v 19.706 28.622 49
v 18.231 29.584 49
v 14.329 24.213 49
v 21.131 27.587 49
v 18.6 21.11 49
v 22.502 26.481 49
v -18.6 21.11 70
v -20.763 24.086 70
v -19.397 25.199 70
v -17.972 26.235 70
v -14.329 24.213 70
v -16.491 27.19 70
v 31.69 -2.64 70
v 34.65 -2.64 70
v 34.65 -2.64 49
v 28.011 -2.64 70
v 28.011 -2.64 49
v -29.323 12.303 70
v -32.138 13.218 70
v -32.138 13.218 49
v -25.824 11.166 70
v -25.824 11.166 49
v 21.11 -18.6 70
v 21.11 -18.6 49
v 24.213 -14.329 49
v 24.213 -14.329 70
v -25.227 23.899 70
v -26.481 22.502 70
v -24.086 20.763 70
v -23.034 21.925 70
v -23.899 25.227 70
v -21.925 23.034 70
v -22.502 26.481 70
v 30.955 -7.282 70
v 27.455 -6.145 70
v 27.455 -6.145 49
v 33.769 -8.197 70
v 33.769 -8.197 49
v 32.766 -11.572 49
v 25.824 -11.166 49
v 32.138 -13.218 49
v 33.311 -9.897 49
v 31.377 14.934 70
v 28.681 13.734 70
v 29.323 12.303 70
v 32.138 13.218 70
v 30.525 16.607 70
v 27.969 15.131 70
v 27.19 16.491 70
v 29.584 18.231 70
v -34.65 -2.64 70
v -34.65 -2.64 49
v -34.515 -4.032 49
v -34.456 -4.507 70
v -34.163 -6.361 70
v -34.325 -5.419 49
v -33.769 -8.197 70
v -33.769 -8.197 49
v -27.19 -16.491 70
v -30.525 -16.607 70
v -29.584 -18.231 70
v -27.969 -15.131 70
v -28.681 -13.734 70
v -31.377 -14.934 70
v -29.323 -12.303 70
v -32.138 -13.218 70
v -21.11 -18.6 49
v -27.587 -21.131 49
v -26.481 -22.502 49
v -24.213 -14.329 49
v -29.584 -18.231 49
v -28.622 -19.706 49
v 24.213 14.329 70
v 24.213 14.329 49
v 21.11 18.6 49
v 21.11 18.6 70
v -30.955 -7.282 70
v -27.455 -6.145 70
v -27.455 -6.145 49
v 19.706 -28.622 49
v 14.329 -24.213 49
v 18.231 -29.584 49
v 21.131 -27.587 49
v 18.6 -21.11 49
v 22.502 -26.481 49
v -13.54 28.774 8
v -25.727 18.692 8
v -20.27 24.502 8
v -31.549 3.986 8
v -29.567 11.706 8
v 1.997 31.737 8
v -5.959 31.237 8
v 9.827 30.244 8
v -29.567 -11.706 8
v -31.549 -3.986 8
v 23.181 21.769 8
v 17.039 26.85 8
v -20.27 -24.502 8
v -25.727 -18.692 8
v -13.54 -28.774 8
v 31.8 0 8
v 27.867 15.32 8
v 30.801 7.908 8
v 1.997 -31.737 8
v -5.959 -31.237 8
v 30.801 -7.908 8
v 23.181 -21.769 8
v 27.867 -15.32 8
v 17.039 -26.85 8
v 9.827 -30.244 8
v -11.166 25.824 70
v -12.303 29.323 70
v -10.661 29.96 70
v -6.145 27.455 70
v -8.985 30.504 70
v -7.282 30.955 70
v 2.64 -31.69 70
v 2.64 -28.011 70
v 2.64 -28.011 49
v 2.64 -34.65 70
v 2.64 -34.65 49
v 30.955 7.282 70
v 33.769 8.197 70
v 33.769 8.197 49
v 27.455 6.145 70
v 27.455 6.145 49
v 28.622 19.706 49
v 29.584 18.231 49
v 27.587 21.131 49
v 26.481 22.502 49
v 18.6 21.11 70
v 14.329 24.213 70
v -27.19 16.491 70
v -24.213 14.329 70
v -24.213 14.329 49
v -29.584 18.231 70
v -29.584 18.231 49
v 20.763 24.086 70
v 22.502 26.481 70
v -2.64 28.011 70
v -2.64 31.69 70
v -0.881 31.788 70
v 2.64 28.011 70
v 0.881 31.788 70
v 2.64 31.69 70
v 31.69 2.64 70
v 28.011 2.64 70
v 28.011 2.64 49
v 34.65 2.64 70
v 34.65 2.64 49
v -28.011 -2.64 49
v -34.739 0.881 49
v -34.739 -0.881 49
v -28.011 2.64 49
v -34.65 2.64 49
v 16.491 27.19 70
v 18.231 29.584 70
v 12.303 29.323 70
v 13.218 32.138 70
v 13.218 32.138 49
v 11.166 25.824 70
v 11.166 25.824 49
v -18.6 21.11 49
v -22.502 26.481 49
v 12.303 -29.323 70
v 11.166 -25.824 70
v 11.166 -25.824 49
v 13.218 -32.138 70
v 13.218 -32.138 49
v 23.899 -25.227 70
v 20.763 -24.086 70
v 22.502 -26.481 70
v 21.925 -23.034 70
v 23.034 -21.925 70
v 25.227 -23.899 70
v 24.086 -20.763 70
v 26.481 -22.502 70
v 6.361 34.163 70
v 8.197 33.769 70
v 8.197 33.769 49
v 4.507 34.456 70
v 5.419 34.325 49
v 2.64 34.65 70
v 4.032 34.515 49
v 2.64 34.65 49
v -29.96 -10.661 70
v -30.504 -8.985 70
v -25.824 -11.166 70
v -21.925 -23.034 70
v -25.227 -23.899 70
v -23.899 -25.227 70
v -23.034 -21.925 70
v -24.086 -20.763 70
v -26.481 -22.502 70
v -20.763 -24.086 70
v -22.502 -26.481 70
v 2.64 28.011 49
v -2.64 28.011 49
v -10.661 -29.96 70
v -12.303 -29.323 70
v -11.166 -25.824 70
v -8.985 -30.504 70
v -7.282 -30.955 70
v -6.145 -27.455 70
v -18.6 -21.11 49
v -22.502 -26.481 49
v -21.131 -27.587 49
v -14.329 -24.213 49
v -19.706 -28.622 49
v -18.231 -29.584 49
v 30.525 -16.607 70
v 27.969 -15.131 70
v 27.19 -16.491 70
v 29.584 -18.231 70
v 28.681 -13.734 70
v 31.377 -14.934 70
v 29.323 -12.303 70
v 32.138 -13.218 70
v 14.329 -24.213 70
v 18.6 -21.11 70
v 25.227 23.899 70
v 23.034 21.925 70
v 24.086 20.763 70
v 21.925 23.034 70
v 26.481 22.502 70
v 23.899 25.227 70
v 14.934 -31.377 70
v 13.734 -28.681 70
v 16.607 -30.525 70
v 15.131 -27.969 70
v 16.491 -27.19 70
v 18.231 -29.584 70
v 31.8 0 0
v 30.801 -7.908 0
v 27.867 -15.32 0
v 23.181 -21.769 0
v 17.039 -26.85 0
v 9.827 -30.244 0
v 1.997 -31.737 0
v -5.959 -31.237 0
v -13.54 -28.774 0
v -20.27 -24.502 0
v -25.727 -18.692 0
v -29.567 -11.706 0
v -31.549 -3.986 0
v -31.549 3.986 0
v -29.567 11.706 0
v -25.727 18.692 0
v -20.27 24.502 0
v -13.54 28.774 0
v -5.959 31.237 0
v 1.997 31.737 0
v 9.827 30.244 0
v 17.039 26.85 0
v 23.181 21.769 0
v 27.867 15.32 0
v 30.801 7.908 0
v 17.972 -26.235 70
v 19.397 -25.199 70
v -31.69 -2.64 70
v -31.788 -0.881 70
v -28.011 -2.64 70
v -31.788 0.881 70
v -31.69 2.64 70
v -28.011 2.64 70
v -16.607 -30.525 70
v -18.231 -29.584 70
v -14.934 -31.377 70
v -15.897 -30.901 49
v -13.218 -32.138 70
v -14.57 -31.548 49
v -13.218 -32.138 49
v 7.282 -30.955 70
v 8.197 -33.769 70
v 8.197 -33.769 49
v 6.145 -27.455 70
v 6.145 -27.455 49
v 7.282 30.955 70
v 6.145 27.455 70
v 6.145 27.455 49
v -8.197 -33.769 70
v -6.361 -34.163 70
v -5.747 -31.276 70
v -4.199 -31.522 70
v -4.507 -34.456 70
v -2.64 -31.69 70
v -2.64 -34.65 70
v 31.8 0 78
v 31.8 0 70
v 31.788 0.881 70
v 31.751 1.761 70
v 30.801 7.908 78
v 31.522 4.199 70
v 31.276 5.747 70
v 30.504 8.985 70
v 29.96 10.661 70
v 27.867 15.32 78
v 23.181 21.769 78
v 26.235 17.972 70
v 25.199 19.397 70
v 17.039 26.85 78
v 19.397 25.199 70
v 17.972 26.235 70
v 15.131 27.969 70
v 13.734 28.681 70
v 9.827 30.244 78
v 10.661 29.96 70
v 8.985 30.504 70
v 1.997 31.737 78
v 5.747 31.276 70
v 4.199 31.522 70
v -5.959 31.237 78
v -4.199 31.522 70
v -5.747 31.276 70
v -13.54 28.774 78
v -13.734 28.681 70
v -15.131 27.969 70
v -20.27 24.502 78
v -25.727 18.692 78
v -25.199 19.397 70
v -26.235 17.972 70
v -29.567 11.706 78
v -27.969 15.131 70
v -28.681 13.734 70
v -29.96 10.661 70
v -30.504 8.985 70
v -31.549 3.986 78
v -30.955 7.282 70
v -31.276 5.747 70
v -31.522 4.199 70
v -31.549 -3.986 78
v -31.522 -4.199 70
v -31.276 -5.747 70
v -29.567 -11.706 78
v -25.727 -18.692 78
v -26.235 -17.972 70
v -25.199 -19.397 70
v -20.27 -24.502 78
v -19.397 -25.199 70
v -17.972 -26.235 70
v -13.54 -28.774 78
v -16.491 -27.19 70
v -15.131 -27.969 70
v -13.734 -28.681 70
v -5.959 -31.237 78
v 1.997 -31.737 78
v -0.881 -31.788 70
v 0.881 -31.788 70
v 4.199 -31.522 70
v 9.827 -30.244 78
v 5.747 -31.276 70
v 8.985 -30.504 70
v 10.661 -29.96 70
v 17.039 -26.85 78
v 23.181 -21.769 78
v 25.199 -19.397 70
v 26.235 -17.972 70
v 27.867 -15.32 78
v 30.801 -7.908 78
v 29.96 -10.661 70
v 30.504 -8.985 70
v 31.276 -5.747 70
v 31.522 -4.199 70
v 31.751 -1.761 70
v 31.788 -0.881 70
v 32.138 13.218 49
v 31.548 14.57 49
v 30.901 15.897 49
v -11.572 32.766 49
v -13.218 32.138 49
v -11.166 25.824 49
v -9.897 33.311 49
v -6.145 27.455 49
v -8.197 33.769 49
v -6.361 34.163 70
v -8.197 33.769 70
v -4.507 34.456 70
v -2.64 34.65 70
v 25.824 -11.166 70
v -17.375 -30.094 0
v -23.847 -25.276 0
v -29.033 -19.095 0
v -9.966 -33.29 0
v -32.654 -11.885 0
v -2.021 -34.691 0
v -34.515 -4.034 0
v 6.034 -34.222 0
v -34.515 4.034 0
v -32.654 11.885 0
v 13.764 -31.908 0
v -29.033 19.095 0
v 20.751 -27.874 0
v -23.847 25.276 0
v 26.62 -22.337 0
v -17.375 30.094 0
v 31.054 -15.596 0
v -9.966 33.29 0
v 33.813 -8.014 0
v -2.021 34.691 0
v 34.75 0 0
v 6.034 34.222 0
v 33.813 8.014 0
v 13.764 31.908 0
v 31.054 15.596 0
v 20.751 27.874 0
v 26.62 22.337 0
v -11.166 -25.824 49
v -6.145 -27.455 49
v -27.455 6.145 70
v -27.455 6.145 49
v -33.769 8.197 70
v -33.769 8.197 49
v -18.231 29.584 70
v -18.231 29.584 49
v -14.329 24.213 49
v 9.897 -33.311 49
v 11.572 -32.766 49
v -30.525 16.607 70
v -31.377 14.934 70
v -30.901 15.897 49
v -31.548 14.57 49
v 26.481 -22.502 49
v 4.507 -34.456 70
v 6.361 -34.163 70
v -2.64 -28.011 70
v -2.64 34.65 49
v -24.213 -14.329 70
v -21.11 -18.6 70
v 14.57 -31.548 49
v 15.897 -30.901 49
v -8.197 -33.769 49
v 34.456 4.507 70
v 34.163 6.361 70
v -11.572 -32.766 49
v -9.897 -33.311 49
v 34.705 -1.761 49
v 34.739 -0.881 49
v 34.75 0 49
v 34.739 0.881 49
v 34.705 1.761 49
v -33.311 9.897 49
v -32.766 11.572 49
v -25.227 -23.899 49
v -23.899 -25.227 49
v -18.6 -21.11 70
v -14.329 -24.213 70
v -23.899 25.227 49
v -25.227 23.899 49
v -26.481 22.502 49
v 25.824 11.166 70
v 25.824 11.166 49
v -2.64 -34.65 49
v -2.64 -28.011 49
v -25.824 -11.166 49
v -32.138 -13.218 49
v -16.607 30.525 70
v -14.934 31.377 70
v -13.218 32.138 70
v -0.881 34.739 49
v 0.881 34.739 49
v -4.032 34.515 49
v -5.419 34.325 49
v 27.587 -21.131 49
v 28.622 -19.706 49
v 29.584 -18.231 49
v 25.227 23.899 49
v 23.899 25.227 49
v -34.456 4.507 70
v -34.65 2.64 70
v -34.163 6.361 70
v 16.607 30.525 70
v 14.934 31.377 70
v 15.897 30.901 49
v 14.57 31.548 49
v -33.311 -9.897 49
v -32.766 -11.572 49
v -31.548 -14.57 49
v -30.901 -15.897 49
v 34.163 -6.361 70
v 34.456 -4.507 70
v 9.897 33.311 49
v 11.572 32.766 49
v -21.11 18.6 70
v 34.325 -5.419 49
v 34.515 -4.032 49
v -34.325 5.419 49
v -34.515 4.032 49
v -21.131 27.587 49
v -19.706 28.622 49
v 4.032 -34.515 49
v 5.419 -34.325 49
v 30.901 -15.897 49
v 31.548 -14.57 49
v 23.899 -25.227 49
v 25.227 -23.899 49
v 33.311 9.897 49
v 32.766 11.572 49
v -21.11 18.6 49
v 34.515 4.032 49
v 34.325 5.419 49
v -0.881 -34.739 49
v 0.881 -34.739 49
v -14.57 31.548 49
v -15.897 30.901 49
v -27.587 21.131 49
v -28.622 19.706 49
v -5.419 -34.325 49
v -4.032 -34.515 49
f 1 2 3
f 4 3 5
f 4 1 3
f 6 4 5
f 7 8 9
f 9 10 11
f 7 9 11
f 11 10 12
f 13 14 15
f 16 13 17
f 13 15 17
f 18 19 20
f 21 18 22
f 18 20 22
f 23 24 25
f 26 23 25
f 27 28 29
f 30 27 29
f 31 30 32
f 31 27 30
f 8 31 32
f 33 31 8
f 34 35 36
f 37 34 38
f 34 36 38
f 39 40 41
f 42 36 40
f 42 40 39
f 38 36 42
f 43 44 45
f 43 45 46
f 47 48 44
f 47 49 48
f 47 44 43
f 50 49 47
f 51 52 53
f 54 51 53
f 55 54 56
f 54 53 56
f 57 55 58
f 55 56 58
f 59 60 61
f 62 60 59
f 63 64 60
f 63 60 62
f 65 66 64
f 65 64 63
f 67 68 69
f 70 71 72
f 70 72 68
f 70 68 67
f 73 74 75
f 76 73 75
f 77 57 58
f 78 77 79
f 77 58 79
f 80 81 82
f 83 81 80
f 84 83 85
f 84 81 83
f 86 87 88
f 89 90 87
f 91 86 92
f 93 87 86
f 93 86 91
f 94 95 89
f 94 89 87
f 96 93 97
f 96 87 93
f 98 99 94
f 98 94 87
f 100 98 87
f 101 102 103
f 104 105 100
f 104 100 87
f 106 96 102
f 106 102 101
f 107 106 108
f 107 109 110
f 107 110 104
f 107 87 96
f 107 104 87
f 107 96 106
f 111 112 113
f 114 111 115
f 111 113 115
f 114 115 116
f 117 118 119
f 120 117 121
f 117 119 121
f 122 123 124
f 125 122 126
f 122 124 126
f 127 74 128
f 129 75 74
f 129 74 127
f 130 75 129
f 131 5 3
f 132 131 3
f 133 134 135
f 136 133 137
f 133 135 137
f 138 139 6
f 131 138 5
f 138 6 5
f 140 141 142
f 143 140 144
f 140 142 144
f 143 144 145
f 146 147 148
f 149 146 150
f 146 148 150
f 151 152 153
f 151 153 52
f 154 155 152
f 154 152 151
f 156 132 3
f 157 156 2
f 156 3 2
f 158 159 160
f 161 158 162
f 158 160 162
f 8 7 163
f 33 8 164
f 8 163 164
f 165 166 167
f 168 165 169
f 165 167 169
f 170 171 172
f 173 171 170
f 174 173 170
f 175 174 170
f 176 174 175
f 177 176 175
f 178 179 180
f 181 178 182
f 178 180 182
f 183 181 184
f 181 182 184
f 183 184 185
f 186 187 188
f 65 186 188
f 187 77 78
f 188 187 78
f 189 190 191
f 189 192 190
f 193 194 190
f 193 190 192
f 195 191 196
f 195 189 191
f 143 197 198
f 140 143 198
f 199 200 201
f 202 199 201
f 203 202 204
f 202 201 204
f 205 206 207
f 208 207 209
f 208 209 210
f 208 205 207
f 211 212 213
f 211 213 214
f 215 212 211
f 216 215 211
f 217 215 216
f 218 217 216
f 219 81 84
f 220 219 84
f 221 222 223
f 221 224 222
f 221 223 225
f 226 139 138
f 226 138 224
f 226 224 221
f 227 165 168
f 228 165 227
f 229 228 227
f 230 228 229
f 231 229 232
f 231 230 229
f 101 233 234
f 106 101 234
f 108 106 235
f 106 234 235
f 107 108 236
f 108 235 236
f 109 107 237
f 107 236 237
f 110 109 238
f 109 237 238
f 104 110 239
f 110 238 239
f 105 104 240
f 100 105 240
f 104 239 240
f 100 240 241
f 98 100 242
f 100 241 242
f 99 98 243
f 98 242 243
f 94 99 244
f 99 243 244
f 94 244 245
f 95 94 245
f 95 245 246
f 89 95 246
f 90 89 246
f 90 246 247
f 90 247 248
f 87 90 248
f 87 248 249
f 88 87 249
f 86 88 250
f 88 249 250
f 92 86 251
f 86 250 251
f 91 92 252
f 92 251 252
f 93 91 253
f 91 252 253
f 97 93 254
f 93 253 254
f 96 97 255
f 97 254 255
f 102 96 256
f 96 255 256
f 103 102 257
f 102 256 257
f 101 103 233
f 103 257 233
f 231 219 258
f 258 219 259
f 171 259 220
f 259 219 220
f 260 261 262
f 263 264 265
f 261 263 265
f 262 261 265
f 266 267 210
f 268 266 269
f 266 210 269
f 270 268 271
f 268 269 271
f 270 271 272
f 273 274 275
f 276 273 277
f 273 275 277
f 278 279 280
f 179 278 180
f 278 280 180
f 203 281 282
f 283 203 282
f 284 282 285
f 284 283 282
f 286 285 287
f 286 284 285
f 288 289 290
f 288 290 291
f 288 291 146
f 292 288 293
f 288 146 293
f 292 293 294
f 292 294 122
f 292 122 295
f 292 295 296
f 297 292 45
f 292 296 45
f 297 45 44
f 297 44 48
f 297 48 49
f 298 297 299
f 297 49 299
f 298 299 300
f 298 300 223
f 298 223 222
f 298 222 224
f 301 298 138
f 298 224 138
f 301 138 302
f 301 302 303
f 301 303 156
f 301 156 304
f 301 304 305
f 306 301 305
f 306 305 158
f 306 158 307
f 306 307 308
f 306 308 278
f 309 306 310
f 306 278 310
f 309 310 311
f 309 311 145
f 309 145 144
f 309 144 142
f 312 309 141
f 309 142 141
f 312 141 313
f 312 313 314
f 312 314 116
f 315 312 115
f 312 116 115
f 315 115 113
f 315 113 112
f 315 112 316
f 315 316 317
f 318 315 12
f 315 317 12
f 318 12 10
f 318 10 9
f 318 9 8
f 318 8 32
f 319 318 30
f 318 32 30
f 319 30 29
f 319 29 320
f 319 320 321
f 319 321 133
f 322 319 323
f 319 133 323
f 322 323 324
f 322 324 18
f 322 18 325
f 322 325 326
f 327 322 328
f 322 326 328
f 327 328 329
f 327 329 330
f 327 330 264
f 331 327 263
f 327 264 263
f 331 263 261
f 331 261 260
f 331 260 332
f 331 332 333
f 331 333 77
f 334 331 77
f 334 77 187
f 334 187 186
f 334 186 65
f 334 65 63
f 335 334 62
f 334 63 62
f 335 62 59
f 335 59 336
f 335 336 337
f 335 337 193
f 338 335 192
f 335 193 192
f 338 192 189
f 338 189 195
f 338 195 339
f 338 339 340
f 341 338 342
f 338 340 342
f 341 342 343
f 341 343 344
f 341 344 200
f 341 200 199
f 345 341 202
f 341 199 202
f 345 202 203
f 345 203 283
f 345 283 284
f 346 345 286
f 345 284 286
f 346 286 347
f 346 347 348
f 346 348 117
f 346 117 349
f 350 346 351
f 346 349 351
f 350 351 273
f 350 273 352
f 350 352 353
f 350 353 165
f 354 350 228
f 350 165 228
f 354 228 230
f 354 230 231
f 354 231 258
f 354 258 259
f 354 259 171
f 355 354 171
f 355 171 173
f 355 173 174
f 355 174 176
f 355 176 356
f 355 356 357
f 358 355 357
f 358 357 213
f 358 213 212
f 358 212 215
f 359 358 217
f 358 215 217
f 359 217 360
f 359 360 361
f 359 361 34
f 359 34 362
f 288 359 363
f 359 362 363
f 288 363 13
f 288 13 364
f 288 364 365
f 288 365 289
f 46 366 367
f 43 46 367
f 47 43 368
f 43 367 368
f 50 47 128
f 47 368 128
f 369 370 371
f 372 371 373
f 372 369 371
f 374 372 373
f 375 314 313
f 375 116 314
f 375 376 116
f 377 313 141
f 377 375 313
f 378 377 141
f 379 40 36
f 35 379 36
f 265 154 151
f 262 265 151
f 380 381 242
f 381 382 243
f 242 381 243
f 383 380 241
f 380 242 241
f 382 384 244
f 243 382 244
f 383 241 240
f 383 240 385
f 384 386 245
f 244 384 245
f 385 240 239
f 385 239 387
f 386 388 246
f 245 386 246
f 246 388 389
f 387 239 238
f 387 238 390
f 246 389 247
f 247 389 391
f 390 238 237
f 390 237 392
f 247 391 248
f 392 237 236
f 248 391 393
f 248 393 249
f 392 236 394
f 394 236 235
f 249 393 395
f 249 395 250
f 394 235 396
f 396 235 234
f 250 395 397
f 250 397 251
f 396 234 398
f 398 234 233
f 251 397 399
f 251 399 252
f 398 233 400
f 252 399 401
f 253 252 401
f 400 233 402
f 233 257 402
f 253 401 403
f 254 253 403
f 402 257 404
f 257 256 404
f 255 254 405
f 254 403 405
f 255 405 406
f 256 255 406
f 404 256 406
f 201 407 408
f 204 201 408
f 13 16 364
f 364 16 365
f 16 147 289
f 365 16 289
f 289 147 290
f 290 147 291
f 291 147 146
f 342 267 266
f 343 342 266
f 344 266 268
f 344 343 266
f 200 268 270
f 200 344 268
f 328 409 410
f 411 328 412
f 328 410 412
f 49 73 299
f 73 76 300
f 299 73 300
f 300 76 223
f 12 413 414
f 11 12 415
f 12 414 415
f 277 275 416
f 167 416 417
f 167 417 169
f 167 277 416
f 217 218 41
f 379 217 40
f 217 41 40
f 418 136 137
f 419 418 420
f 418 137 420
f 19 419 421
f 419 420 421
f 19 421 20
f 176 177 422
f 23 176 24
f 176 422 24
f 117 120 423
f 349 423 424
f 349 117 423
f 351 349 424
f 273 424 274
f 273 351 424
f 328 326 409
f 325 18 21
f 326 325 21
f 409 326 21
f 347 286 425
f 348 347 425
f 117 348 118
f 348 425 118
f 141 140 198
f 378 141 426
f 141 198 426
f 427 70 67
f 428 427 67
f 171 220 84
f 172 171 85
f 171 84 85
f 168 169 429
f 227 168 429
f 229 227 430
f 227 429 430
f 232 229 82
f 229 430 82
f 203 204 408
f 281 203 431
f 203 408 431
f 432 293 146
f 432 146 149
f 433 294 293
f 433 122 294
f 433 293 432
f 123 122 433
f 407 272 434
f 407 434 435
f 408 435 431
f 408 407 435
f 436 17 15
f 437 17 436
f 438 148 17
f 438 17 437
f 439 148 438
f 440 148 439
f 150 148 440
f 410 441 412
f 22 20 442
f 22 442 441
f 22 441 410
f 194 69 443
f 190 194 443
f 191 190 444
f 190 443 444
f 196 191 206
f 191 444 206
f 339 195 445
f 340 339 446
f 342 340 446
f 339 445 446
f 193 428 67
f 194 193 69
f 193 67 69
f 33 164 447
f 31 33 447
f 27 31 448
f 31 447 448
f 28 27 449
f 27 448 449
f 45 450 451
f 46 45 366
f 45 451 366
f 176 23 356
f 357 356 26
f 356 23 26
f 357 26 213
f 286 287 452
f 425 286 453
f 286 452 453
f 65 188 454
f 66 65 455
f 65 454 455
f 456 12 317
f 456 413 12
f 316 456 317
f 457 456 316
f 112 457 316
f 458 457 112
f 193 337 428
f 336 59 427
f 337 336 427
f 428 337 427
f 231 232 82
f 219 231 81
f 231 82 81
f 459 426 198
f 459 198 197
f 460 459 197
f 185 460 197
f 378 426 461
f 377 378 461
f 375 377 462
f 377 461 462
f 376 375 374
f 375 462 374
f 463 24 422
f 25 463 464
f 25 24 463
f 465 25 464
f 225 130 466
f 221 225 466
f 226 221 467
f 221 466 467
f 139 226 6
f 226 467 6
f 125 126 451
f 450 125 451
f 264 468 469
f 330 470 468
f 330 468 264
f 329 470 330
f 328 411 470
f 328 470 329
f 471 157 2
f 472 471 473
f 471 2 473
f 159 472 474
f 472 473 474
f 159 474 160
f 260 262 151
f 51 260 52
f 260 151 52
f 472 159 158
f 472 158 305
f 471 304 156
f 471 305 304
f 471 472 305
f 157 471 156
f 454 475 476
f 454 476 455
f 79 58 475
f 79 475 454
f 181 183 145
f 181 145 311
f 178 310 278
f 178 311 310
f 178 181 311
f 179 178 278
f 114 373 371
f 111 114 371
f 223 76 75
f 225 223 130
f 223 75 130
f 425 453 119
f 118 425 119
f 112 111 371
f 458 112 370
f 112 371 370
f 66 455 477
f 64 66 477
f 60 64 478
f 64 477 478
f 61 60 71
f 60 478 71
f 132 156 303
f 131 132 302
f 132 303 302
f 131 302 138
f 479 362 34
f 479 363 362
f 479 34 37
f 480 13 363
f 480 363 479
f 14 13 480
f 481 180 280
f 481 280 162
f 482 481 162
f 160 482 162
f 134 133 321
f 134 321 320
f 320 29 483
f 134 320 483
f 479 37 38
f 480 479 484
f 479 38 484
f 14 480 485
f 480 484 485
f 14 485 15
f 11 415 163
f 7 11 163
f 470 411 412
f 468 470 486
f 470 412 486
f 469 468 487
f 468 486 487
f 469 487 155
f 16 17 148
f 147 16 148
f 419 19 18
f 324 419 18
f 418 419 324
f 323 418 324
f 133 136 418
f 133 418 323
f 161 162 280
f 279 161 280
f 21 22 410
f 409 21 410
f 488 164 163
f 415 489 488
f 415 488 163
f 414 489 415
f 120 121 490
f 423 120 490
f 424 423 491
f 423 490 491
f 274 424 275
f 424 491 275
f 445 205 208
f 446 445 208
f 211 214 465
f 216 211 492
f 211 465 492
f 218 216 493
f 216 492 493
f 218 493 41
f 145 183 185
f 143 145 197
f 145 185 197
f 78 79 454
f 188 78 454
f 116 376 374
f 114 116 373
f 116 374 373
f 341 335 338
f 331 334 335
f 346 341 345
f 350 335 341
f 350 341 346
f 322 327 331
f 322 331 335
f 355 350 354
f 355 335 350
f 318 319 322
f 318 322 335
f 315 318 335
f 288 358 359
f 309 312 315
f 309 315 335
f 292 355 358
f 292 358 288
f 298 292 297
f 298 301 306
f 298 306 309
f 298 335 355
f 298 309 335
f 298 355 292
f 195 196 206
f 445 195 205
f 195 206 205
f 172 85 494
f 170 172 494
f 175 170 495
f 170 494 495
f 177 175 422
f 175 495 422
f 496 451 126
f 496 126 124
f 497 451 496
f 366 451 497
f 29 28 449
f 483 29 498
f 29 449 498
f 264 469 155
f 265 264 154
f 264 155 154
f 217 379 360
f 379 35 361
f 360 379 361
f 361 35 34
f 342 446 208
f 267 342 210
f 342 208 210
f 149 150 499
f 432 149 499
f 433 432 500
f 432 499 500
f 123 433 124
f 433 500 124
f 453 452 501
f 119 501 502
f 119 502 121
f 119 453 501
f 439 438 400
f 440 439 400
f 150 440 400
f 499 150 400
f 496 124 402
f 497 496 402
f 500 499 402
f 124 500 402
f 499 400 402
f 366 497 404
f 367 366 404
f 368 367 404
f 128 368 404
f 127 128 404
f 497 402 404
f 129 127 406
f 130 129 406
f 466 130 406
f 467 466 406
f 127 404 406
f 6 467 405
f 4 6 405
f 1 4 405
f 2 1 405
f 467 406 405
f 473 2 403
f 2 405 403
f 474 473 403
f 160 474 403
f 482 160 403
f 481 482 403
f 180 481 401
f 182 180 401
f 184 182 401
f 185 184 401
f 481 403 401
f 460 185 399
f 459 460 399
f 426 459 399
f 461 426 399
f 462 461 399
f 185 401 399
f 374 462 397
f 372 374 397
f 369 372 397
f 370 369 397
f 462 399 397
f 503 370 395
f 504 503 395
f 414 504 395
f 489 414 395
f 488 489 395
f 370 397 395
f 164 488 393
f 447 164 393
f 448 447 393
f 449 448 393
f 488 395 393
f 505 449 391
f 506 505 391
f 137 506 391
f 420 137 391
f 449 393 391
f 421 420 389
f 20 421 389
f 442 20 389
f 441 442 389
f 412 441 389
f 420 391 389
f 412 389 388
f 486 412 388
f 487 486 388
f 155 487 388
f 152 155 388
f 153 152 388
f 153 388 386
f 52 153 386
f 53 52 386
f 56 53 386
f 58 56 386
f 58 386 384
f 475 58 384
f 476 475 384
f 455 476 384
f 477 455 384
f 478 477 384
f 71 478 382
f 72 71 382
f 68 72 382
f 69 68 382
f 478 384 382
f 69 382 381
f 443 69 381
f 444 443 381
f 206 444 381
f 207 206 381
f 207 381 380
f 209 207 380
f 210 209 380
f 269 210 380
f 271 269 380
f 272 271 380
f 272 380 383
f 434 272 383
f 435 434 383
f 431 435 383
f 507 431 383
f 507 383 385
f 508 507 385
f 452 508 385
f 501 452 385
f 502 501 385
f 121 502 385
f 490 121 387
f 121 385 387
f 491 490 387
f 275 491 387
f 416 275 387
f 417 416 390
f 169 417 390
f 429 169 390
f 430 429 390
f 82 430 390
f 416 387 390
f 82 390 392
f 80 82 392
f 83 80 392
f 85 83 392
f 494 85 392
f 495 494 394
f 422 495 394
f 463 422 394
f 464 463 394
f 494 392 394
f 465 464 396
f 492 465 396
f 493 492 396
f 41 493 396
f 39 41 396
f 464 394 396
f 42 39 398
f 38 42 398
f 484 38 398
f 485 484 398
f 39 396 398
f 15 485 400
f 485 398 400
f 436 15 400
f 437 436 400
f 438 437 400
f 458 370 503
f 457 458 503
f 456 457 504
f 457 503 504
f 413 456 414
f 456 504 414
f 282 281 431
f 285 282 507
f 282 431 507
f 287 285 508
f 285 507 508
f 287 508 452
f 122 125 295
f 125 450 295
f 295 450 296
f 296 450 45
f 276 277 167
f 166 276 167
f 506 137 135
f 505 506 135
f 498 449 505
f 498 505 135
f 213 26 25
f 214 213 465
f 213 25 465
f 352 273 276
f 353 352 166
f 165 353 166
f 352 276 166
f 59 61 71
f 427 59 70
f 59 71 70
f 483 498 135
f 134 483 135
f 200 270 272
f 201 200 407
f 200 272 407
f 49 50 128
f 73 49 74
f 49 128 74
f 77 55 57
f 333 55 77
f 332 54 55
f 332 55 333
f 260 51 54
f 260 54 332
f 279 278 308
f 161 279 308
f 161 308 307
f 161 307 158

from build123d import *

# Parameters (mm, degrees)
F0_R     = 34.75
F1_DEPTH = 49
F3_DEPTH = 21
F4_R     = 31.8
F5_DEPTH = 8
F6_R     = 31.8
F7_DEPTH = 8


with BuildPart() as f1:
    # F0 (on Top) → F1 (new body)
    with BuildSketch(Plane.XY):
        Circle(F0_R)
    extrude(amount=F1_DEPTH)

    # F2 (on face) → F3 (join)
    with BuildSketch(Plane.XY.offset(49)):
        with BuildLine():
            Line((-2.639753, 28.010705), (-2.639753, 34.649592))
            ThreePointArc((-2.639753, 34.649592), (-5.436098, 34.32217), (-8.196759, 33.769448))
            Line((-8.196759, 33.769448), (-6.14523, 27.455492))
            Line((-6.14523, 27.455492), (-11.166338, 25.824036))
            Line((-11.166338, 25.824036), (-13.217867, 32.137992))
            ThreePointArc((-13.217867, 32.137992), (-15.77617, 30.962477), (-18.230914, 29.583716))
            Line((-18.230914, 29.583716), (-14.328675, 24.212744))
            Line((-14.328675, 24.212744), (-18.599884, 21.109529))
            Line((-18.599884, 21.109529), (-22.502124, 26.480501))
            ThreePointArc((-22.502124, 26.480501), (-24.571961, 24.571961), (-26.480501, 22.502124))
            Line((-26.480501, 22.502124), (-21.109529, 18.599884))
            Line((-21.109529, 18.599884), (-24.212744, 14.328675))
            Line((-24.212744, 14.328675), (-29.583716, 18.230914))
            ThreePointArc((-29.583716, 18.230914), (-30.962477, 15.77617), (-32.137992, 13.217867))
            Line((-32.137992, 13.217867), (-25.824036, 11.166338))
            Line((-25.824036, 11.166338), (-27.455492, 6.14523))
            Line((-27.455492, 6.14523), (-33.769448, 8.196759))
            ThreePointArc((-33.769448, 8.196759), (-34.32217, 5.436098), (-34.649592, 2.639753))
            Line((-34.649592, 2.639753), (-28.010705, 2.639753))
            Line((-28.010705, 2.639753), (-28.010705, -2.639753))
            Line((-28.010705, -2.639753), (-34.649592, -2.639753))
            ThreePointArc((-34.649592, -2.639753), (-34.32217, -5.436098), (-33.769448, -8.196759))
            Line((-33.769448, -8.196759), (-27.455492, -6.14523))
            Line((-27.455492, -6.14523), (-25.824036, -11.166338))
            Line((-25.824036, -11.166338), (-32.137992, -13.217867))
            ThreePointArc((-32.137992, -13.217867), (-30.962477, -15.77617), (-29.583716, -18.230914))
            Line((-29.583716, -18.230914), (-24.212744, -14.328675))
            Line((-24.212744, -14.328675), (-21.109529, -18.599884))
            Line((-21.109529, -18.599884), (-26.480501, -22.502124))
            ThreePointArc((-26.480501, -22.502124), (-24.571961, -24.571961), (-22.502124, -26.480501))
            Line((-22.502124, -26.480501), (-18.599884, -21.109529))
            Line((-18.599884, -21.109529), (-14.328675, -24.212744))
            Line((-14.328675, -24.212744), (-18.230914, -29.583716))
            ThreePointArc((-18.230914, -29.583716), (-15.77617, -30.962477), (-13.217867, -32.137992))
            Line((-13.217867, -32.137992), (-11.166338, -25.824036))
            Line((-11.166338, -25.824036), (-6.14523, -27.455492))
            Line((-6.14523, -27.455492), (-8.196759, -33.769448))
            ThreePointArc((-8.196759, -33.769448), (-5.436098, -34.32217), (-2.639753, -34.649592))
            Line((-2.639753, -34.649592), (-2.639753, -28.010705))
            Line((-2.639753, -28.010705), (2.639753, -28.010705))
            Line((2.639753, -28.010705), (2.639753, -34.649592))
            ThreePointArc((2.639753, -34.649592), (5.436098, -34.32217), (8.196759, -33.769448))
            Line((8.196759, -33.769448), (6.14523, -27.455492))
            Line((6.14523, -27.455492), (11.166338, -25.824036))
            Line((11.166338, -25.824036), (13.217867, -32.137992))
            ThreePointArc((13.217867, -32.137992), (15.77617, -30.962477), (18.230914, -29.583716))
            Line((18.230914, -29.583716), (14.328675, -24.212744))
            Line((14.328675, -24.212744), (18.599884, -21.109529))
            Line((18.599884, -21.109529), (22.502124, -26.480501))
            ThreePointArc((22.502124, -26.480501), (24.571961, -24.571961), (26.480501, -22.502124))
            Line((26.480501, -22.502124), (21.109529, -18.599884))
            Line((21.109529, -18.599884), (24.212744, -14.328675))
            Line((24.212744, -14.328675), (29.583716, -18.230914))
            ThreePointArc((29.583716, -18.230914), (30.962477, -15.77617), (32.137992, -13.217867))
            Line((32.137992, -13.217867), (25.824036, -11.166338))
            Line((25.824036, -11.166338), (27.455492, -6.14523))
            Line((27.455492, -6.14523), (33.769448, -8.196759))
            ThreePointArc((33.769448, -8.196759), (34.32217, -5.436098), (34.649592, -2.639753))
            Line((34.649592, -2.639753), (28.010705, -2.639753))
            Line((28.010705, -2.639753), (28.010705, 2.639753))
            Line((28.010705, 2.639753), (34.649592, 2.639753))
            ThreePointArc((34.649592, 2.639753), (34.32217, 5.436098), (33.769448, 8.196759))
            Line((33.769448, 8.196759), (27.455492, 6.14523))
            Line((27.455492, 6.14523), (25.824036, 11.166338))
            Line((25.824036, 11.166338), (32.137992, 13.217867))
            ThreePointArc((32.137992, 13.217867), (30.962477, 15.77617), (29.583716, 18.230914))
            Line((29.583716, 18.230914), (24.212744, 14.328675))
            Line((24.212744, 14.328675), (21.109529, 18.599884))
            Line((21.109529, 18.599884), (26.480501, 22.502124))
            ThreePointArc((26.480501, 22.502124), (24.571961, 24.571961), (22.502124, 26.480501))
            Line((22.502124, 26.480501), (18.599884, 21.109529))
            Line((18.599884, 21.109529), (14.328675, 24.212744))
            Line((14.328675, 24.212744), (18.230914, 29.583716))
            ThreePointArc((18.230914, 29.583716), (15.77617, 30.962477), (13.217867, 32.137992))
            Line((13.217867, 32.137992), (11.166338, 25.824036))
            Line((11.166338, 25.824036), (6.14523, 27.455492))
            Line((6.14523, 27.455492), (8.196759, 33.769448))
            ThreePointArc((8.196759, 33.769448), (5.436098, 34.32217), (2.639753, 34.649592))
            Line((2.639753, 34.649592), (2.639753, 28.010705))
            Line((2.639753, 28.010705), (-2.639753, 28.010705))
        make_face()
    extrude(amount=F3_DEPTH)

    # F4 (on face) → F5 (join)
    with BuildSketch(Plane.XY.offset(70)):
        Circle(F4_R)
    extrude(amount=F5_DEPTH)

    # F6 (on face) → F7 (cut)
    with BuildSketch(Plane(origin=(0, 0, 0), x_dir=(1, 0, 0), z_dir=(0, 0, -1))):
        Circle(F6_R)
    extrude(amount=-F7_DEPTH, mode=Mode.SUBTRACT)


solid = f1.part
